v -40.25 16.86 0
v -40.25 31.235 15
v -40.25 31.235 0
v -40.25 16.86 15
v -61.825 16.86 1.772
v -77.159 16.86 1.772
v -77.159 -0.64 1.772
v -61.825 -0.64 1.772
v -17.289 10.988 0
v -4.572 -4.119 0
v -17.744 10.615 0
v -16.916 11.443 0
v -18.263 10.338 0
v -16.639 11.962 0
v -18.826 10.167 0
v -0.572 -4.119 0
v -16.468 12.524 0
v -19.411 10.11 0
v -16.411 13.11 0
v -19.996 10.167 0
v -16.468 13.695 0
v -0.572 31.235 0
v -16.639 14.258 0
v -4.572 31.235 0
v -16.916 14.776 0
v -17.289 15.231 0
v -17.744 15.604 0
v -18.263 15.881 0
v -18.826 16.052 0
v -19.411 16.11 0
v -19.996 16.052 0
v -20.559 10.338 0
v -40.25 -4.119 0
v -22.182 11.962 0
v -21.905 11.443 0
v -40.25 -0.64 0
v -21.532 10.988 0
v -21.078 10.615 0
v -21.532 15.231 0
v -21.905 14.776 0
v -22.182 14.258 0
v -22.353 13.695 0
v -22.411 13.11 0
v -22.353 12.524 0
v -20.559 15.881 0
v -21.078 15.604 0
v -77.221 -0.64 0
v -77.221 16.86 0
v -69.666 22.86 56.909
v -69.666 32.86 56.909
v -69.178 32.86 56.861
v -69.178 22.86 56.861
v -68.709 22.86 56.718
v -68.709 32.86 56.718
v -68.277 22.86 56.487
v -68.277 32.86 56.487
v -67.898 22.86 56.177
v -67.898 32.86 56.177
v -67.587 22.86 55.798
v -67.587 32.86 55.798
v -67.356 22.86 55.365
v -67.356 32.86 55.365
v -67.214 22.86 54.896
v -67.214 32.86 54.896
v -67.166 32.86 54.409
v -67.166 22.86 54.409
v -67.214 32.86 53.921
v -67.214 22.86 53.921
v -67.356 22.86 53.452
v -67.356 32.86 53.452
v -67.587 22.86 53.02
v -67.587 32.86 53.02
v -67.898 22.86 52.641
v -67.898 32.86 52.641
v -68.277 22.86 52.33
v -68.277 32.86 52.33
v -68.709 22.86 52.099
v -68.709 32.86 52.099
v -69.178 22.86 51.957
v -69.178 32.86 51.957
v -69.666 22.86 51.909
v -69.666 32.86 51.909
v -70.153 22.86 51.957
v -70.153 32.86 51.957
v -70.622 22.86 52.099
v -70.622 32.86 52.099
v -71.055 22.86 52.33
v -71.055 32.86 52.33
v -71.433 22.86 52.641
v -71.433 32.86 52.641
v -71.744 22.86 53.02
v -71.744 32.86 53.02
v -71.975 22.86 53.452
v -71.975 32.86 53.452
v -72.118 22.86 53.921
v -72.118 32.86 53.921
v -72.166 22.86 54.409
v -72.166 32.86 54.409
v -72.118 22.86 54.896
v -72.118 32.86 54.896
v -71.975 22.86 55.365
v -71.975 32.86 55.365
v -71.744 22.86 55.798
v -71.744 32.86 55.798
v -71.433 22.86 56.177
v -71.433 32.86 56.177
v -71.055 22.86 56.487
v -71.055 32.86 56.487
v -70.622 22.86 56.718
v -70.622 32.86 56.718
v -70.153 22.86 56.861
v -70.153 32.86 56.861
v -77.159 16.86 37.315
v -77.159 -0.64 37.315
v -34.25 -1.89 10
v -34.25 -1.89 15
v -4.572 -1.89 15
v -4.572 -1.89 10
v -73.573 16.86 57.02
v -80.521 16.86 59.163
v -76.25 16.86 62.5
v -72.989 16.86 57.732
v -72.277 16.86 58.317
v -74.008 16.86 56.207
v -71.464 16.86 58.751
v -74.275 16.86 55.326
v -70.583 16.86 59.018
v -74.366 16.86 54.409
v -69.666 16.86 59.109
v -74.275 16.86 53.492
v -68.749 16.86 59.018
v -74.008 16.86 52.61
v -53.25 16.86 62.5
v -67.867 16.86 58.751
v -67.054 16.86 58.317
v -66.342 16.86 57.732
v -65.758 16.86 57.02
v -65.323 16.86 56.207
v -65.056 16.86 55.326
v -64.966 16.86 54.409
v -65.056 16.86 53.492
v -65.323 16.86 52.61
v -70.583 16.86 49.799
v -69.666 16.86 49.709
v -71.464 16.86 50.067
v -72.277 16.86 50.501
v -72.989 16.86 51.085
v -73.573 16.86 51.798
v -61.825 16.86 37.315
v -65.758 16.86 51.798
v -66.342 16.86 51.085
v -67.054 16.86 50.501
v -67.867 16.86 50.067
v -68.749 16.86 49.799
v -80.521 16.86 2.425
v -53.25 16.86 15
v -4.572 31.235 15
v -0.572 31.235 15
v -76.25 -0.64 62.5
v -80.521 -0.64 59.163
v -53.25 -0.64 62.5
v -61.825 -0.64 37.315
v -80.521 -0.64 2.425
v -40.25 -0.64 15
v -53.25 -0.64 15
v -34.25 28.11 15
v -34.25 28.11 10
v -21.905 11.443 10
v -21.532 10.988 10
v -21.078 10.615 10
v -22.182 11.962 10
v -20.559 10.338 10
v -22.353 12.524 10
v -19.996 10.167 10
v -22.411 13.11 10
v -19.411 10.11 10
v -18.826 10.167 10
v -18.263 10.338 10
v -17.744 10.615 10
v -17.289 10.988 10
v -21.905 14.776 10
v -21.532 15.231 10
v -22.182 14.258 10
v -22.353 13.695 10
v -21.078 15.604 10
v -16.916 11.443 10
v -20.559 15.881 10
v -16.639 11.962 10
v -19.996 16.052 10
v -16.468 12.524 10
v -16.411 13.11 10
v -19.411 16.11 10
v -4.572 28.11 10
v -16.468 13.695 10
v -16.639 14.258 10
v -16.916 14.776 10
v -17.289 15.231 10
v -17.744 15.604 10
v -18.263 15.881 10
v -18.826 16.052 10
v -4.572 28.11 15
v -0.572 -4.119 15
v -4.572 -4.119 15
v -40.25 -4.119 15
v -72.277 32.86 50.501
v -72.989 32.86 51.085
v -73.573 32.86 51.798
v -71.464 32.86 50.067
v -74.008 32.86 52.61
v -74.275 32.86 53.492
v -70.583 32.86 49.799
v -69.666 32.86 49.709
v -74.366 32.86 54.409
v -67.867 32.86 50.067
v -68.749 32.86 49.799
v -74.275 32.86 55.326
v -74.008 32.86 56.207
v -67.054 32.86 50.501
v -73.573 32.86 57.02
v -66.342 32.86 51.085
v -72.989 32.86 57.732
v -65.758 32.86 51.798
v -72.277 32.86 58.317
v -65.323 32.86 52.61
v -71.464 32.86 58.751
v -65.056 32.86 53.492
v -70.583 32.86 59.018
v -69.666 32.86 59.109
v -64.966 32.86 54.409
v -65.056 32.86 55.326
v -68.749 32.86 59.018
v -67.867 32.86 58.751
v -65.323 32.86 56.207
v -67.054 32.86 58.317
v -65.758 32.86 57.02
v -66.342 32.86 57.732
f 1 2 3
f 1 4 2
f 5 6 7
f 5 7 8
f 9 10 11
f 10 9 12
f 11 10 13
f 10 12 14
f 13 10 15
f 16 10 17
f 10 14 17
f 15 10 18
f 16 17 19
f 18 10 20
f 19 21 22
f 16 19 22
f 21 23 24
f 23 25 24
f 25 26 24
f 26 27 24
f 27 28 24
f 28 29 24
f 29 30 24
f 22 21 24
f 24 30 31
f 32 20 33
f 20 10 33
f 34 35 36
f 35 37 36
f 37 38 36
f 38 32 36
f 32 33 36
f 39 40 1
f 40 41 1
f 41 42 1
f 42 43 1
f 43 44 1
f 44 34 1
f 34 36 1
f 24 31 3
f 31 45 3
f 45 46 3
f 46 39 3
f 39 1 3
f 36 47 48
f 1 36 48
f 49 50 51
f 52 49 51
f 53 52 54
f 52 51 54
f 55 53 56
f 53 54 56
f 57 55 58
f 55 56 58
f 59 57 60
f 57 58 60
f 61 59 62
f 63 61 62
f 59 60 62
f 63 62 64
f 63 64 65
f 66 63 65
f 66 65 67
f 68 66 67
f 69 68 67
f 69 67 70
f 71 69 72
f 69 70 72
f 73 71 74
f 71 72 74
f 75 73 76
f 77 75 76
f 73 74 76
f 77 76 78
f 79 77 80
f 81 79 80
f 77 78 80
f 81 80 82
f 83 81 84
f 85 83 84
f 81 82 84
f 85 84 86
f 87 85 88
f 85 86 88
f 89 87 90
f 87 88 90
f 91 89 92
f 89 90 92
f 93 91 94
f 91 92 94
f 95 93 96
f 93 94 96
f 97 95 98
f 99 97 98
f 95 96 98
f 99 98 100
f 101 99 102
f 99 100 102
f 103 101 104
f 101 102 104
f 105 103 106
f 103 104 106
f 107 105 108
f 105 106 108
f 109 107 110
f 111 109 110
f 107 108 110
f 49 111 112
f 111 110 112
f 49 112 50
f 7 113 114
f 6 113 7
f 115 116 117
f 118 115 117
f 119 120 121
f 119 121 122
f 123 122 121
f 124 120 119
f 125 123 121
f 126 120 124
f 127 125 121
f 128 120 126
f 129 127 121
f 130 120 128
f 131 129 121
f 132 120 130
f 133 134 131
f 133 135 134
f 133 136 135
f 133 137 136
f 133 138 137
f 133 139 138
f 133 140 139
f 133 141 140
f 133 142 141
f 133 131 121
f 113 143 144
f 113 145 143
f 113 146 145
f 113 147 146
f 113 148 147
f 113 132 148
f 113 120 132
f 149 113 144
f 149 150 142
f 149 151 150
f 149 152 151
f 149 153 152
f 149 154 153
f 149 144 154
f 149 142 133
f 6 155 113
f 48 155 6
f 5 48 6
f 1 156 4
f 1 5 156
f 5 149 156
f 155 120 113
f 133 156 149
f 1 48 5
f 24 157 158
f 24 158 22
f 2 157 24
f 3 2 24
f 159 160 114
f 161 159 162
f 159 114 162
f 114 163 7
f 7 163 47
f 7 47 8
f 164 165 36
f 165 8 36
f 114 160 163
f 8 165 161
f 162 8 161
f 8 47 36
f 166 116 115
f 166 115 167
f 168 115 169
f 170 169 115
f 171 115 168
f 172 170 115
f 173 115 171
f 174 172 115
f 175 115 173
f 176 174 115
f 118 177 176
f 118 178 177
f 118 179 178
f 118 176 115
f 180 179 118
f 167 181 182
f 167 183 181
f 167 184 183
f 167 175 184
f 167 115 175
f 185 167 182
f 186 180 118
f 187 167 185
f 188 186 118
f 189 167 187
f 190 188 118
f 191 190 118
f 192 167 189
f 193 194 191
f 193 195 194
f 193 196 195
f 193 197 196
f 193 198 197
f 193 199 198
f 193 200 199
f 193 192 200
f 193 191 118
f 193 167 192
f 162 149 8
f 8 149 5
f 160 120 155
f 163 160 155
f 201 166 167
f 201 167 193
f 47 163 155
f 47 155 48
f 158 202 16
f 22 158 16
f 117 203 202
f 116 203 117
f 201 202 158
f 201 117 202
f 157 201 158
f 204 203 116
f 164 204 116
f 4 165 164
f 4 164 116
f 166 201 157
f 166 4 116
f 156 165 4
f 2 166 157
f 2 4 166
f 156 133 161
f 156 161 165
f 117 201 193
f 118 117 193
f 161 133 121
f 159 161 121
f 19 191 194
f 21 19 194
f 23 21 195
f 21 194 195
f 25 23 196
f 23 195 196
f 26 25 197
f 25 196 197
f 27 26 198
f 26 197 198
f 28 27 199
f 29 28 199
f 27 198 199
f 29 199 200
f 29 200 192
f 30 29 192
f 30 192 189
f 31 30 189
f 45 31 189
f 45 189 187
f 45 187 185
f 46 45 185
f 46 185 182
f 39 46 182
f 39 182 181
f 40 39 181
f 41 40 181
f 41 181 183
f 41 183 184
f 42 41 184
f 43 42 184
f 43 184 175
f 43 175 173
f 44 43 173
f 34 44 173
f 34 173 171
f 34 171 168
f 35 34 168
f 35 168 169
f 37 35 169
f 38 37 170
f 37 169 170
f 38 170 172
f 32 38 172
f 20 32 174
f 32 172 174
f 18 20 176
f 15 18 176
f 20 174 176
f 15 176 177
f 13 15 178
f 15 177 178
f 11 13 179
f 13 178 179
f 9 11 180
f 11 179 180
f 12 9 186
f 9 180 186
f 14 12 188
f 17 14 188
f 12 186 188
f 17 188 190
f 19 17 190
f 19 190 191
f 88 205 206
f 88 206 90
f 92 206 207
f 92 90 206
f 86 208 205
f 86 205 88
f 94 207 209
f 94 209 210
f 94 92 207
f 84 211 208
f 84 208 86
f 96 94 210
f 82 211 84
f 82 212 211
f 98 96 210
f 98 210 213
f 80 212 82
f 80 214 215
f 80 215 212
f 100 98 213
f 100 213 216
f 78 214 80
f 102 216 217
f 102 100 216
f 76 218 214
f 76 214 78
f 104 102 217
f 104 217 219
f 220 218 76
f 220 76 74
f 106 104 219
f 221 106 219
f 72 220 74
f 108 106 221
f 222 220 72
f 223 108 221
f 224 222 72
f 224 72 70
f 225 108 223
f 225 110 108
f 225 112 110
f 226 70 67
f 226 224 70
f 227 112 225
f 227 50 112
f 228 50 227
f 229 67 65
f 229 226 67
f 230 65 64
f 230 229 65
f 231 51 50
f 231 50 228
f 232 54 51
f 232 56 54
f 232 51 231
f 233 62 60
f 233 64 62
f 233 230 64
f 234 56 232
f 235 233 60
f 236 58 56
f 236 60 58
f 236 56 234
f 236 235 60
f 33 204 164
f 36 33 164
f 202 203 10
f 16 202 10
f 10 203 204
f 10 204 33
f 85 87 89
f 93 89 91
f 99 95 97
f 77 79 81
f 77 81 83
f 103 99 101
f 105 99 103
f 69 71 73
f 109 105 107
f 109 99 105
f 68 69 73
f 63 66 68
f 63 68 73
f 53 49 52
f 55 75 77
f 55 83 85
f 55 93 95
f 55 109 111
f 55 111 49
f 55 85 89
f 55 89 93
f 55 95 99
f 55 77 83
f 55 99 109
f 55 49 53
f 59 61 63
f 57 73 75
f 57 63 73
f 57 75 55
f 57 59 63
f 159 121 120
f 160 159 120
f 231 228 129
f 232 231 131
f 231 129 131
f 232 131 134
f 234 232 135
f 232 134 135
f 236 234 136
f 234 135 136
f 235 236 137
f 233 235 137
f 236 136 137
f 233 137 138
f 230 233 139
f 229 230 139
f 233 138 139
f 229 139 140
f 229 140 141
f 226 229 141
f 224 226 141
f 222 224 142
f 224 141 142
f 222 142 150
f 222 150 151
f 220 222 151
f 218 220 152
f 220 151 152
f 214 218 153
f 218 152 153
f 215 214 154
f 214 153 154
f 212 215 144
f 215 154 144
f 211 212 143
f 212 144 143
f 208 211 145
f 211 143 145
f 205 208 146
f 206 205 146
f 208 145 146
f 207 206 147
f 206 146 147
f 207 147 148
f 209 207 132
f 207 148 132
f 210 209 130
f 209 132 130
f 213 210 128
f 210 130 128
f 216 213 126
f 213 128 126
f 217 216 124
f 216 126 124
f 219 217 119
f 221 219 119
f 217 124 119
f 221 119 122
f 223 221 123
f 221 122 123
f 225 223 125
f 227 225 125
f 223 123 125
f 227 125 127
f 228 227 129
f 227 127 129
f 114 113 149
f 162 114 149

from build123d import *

# Parameters (mm, degrees)
SKETCH1_W            = 55
SKETCH1_H            = 55
SKETCH1_W_2          = 30
SKETCH1_H_2          = 30
BOSS_EXTRUDE1_DEPTH  = 15
SKETCH5_W            = 70
SKETCH5_H            = 70
BOSS_EXTRUDE4_DEPTH  = 17.5
CUT_EXTRUDE1_DEPTH   = 143.483240955
SKETCH8_W            = 15.334329656
SKETCH8_H            = 35.542805721
CUT_EXTRUDE3_DEPTH   = 126.3514749
SKETCH9_R            = 4.7
BOSS_EXTRUDE5_DEPTH  = 16
SKETCH10_R           = 2.5
CUT_EXTRUDE4_DEPTH   = 10
SKETCH12_W           = 30
SKETCH12_H           = 30
BOSS_EXTRUDE6_DEPTH  = 5
SKETCH15_W           = 55
SKETCH15_H           = 15
BOSS_EXTRUDE7_DEPTH  = 18.75
SKETCH16_W           = 30
SKETCH16_H           = 30
BOSS_EXTRUDE8_DEPTH  = 10
SKETCH18_W           = 55
SKETCH18_H           = 18.75
CUT_EXTRUDE6_DEPTH   = 119.922964864
SKETCH20_W           = 15
SKETCH20_H           = 18.75
BOSS_EXTRUDE9_DEPTH  = 12
SKETCH21_W           = 12
SKETCH21_H           = 55
CUT_EXTRUDE9_DEPTH   = 119.330278287
SKETCH23_W           = 48.677589722
SKETCH23_H           = 9.375
CUT_EXTRUDE11_DEPTH  = 110.913811483
CUT_EXTRUDE13_DEPTH  = 116.802667864
SKETCH26_W           = 15
SKETCH26_H           = 9.375
CUT_EXTRUDE14_DEPTH  = 13
CUT_EXTRUDE15_DEPTH  = 111.026884691
SKETCH28_W           = 35.677589722
SKETCH28_H           = 15
BOSS_EXTRUDE10_DEPTH = 5
SKETCH22_W           = 30
SKETCH22_H           = 30
CUT_EXTRUDE16_DEPTH  = 5
SKETCH30_W           = 35.677589722
SKETCH30_H           = 5.896456585
CUT_EXTRUDE18_DEPTH  = 100.094209449
SKETCH32_W           = 15
SKETCH32_H           = 35.353543415
BOSS_EXTRUDE12_DEPTH = 4
SKETCH33_R           = 3
CUT_EXTRUDE19_DEPTH  = 102.585738893


with BuildPart() as part:
    # Sketch1 → Boss-Extrude1 (new body)
    with BuildSketch(Plane.XY):
        with Locations((-13.749602036, -10.640258422)):
            Rectangle(SKETCH1_W, SKETCH1_H)
        with Locations((-13.749602036, -10.640258422)):
            Rectangle(SKETCH1_W_2, SKETCH1_H_2, mode=Mode.SUBTRACT)
    extrude(amount=BOSS_EXTRUDE1_DEPTH)

    # Sketch12 → Boss-Extrude6 (add)
    with BuildSketch(Plane(origin=(-732.77025481, -892.317517431, 5), x_dir=(1, 0, 0), z_dir=(0, 0, 1))):
        with Locations((719.020652774, 881.677259009)):
            Rectangle(SKETCH12_W, SKETCH12_H)
    extrude(amount=-BOSS_EXTRUDE6_DEPTH)



with BuildPart() as body_2:
    # Sketch5 → Boss-Extrude4 (new body)
    with BuildSketch(Plane(origin=(0, 16.859741578, 0), x_dir=(1, 0, 0), z_dir=(0, 1, 0))):
        with Locations((-76.249602036, -35)):
            Rectangle(SKETCH5_W, SKETCH5_H)
    extrude(amount=-BOSS_EXTRUDE4_DEPTH)

    # Sketch6 → Cut-Extrude1 (cut, through all)
    with BuildSketch(Plane(origin=(0, 16.859741578, 0), x_dir=(1, 0, 0), z_dir=(0, 1, 0))):
        Polygon((-77.220552794, 0), (-111.249602036, 0), (-111.249602036, -70), (-76.249602036, -70), (-88.249602036, -61.428571429), (-88.249602036, -8.102672193), align=None)
    extrude(amount=-CUT_EXTRUDE1_DEPTH, mode=Mode.SUBTRACT)

    # Sketch8 → Cut-Extrude3 (cut, through all)
    with BuildSketch(Plane(origin=(0, 16.859741578, 0), x_dir=(1, 0, 0), z_dir=(0, 1, 0))):
        with Locations((-69.49219179, -19.543404801)):
            Rectangle(SKETCH8_W, SKETCH8_H)
    extrude(amount=-CUT_EXTRUDE3_DEPTH, mode=Mode.SUBTRACT)

    # Sketch9 → Boss-Extrude5 (add)
    with BuildSketch(Plane(origin=(0, 16.859741578, 0), x_dir=(1, 0, 0), z_dir=(0, 1, 0))):
        with Locations(Location((-69.665580404, -54.408733969, 0), (0, 0, 270))):
            Circle(SKETCH9_R)
    extrude(amount=BOSS_EXTRUDE5_DEPTH)

    # Sketch10 → Cut-Extrude4 (cut)
    with BuildSketch(Plane(origin=(0, 32.859741578, 0), x_dir=(1, 0, 0), z_dir=(0, 1, 0))):
        with Locations(Location((-69.665580404, -54.408733969, 0), (0, 0, 270))):
            Circle(SKETCH10_R)
    extrude(amount=-CUT_EXTRUDE4_DEPTH, mode=Mode.SUBTRACT)


with BuildPart() as part_1:
    add(part.part)

    add(body_2.part)  # Boss-Extrude7 merges body 2
    # Sketch15 → Boss-Extrude7 (add)
    with BuildSketch(Plane(origin=(0, 16.859741578, 0), x_dir=(1, 0, 0), z_dir=(0, 1, 0))):
        with Locations((-13.749602036, -7.5)):
            Rectangle(SKETCH15_W, SKETCH15_H)
    extrude(amount=BOSS_EXTRUDE7_DEPTH)

    # Sketch16 → Boss-Extrude8 (add)
    with BuildSketch(Plane.XY.offset(15)):
        with Locations((-13.749602036, -10.640258422)):
            Rectangle(SKETCH16_W, SKETCH16_H)
    extrude(amount=-BOSS_EXTRUDE8_DEPTH)

    # Sketch18 → Cut-Extrude6 (cut, through all)
    with BuildSketch(Plane(origin=(0, 0, 0), x_dir=(-1, 0, 0), z_dir=(0, 0, -1))):
        with Locations((13.749602036, -28.765258422)):
            Rectangle(SKETCH18_W, SKETCH18_H)
    extrude(amount=-CUT_EXTRUDE6_DEPTH, mode=Mode.SUBTRACT)

    # Sketch20 → Boss-Extrude9 (add)
    with BuildSketch(Plane.ZY.offset(41.249602036)):
        with Locations((7.5, 26.234741578)):
            Rectangle(SKETCH20_W, SKETCH20_H)
        with Locations((7.5, -10.015258422)):
            Rectangle(SKETCH20_W, SKETCH20_H)
    extrude(amount=BOSS_EXTRUDE9_DEPTH)

    # Sketch21 → Cut-Extrude9 (cut, through all)
    with BuildSketch(Plane(origin=(0, 16.859741578, 0), x_dir=(1, 0, 0), z_dir=(0, 1, 0))):
        with Locations((-47.249602036, -42.5)):
            Rectangle(SKETCH21_W, SKETCH21_H)
    extrude(amount=-CUT_EXTRUDE9_DEPTH, mode=Mode.SUBTRACT)

    # Sketch23 → Cut-Extrude11 (cut, through all)
    with BuildSketch(Plane.XY.offset(15)):
        with Locations((-28.910807175, -14.702758422)):
            Rectangle(SKETCH23_W, SKETCH23_H)
        with Locations((-28.910807175, 30.922241578)):
            Rectangle(SKETCH23_W, SKETCH23_H)
        Polygon((13.750397964, -19.390258422), (13.750397964, 35.609741578), (-4.572012314, 35.609741578), (-4.572012314, 26.234741578), (-4.572012314, -10.015258422), (-4.572012314, -19.390258422), align=None)
    extrude(amount=-CUT_EXTRUDE11_DEPTH, mode=Mode.SUBTRACT)

    # Sketch25 → Cut-Extrude13 (cut, through all)
    with BuildSketch(Plane(origin=(0, 16.859741578, 0), x_dir=(1, 0, 0), z_dir=(0, 1, 0))):
        Polygon((-80.521113565, -2.424811187), (-88.249602036, -8.102672193), (-88.249602036, -61.428571429), (-80.521113565, -66.948920336), align=None)
    extrude(amount=-CUT_EXTRUDE13_DEPTH, mode=Mode.SUBTRACT)

    # Sketch26 → Cut-Extrude14 (cut)
    with BuildSketch(Plane.ZY.offset(53.249602036)):
        with Locations((7.5, 21.547241578)):
            Rectangle(SKETCH26_W, SKETCH26_H)
    extrude(amount=-CUT_EXTRUDE14_DEPTH, mode=Mode.SUBTRACT)

    # Sketch27 → Cut-Extrude15 (cut, through all)
    with BuildSketch(Plane(origin=(0, 16.859741578, 0), x_dir=(1, 0, 0), z_dir=(0, 1, 0))):
        Polygon((-53.249602036, -70), (-53.249602036, -62.5), (-76.249602036, -62.5), (-80.521113565, -59.162729439), (-80.521113565, -66.948920336), (-76.249602036, -70), align=None)
    extrude(amount=-CUT_EXTRUDE15_DEPTH, mode=Mode.SUBTRACT)

    # Sketch28 → Boss-Extrude10 (add)
    with BuildSketch(Plane(origin=(0, 26.234741578, 0), x_dir=(1, 0, 0), z_dir=(0, 1, 0))):
        with Locations((-22.410807175, -7.5)):
            Rectangle(SKETCH28_W, SKETCH28_H)
    extrude(amount=BOSS_EXTRUDE10_DEPTH)

    # Sketch22 → Cut-Extrude16 (cut)
    with BuildSketch(Plane.XY.offset(15)):
        with Locations((-19.249602036, 13.109741578)):
            Rectangle(SKETCH22_W, SKETCH22_H)
    extrude(amount=-CUT_EXTRUDE16_DEPTH, mode=Mode.SUBTRACT)

    # Sketch30 → Cut-Extrude18 (cut, through all)
    with BuildSketch(Plane.XY.offset(15)):
        Polygon((-40.249602036, -0.640258422), (-53.249602036, -0.640258422), (-53.249602036, -10.015258422), (-40.249602036, -10.015258422), (-40.249602036, -4.118801837), align=None)
        with Locations((-22.410807175, -7.06703013)):
            Rectangle(SKETCH30_W, SKETCH30_H)
    extrude(amount=-CUT_EXTRUDE18_DEPTH, mode=Mode.SUBTRACT)

    # Sketch32 → Boss-Extrude12 (add)
    with BuildSketch(Plane(origin=(-4.572012314, 0, 0), x_dir=(0, 0, -1), z_dir=(1, 0, 0))):
        with Locations((-7.5, 13.557969871)):
            Rectangle(SKETCH32_W, SKETCH32_H)
    extrude(amount=BOSS_EXTRUDE12_DEPTH)

    # Sketch33 → Cut-Extrude19 (cut, through all)
    with BuildSketch(Plane.XY.offset(10)):
        with Locations((-19.410807175, 13.109741578)):
            Circle(SKETCH33_R)
    extrude(amount=-CUT_EXTRUDE19_DEPTH, mode=Mode.SUBTRACT)


solid = part_1.part
